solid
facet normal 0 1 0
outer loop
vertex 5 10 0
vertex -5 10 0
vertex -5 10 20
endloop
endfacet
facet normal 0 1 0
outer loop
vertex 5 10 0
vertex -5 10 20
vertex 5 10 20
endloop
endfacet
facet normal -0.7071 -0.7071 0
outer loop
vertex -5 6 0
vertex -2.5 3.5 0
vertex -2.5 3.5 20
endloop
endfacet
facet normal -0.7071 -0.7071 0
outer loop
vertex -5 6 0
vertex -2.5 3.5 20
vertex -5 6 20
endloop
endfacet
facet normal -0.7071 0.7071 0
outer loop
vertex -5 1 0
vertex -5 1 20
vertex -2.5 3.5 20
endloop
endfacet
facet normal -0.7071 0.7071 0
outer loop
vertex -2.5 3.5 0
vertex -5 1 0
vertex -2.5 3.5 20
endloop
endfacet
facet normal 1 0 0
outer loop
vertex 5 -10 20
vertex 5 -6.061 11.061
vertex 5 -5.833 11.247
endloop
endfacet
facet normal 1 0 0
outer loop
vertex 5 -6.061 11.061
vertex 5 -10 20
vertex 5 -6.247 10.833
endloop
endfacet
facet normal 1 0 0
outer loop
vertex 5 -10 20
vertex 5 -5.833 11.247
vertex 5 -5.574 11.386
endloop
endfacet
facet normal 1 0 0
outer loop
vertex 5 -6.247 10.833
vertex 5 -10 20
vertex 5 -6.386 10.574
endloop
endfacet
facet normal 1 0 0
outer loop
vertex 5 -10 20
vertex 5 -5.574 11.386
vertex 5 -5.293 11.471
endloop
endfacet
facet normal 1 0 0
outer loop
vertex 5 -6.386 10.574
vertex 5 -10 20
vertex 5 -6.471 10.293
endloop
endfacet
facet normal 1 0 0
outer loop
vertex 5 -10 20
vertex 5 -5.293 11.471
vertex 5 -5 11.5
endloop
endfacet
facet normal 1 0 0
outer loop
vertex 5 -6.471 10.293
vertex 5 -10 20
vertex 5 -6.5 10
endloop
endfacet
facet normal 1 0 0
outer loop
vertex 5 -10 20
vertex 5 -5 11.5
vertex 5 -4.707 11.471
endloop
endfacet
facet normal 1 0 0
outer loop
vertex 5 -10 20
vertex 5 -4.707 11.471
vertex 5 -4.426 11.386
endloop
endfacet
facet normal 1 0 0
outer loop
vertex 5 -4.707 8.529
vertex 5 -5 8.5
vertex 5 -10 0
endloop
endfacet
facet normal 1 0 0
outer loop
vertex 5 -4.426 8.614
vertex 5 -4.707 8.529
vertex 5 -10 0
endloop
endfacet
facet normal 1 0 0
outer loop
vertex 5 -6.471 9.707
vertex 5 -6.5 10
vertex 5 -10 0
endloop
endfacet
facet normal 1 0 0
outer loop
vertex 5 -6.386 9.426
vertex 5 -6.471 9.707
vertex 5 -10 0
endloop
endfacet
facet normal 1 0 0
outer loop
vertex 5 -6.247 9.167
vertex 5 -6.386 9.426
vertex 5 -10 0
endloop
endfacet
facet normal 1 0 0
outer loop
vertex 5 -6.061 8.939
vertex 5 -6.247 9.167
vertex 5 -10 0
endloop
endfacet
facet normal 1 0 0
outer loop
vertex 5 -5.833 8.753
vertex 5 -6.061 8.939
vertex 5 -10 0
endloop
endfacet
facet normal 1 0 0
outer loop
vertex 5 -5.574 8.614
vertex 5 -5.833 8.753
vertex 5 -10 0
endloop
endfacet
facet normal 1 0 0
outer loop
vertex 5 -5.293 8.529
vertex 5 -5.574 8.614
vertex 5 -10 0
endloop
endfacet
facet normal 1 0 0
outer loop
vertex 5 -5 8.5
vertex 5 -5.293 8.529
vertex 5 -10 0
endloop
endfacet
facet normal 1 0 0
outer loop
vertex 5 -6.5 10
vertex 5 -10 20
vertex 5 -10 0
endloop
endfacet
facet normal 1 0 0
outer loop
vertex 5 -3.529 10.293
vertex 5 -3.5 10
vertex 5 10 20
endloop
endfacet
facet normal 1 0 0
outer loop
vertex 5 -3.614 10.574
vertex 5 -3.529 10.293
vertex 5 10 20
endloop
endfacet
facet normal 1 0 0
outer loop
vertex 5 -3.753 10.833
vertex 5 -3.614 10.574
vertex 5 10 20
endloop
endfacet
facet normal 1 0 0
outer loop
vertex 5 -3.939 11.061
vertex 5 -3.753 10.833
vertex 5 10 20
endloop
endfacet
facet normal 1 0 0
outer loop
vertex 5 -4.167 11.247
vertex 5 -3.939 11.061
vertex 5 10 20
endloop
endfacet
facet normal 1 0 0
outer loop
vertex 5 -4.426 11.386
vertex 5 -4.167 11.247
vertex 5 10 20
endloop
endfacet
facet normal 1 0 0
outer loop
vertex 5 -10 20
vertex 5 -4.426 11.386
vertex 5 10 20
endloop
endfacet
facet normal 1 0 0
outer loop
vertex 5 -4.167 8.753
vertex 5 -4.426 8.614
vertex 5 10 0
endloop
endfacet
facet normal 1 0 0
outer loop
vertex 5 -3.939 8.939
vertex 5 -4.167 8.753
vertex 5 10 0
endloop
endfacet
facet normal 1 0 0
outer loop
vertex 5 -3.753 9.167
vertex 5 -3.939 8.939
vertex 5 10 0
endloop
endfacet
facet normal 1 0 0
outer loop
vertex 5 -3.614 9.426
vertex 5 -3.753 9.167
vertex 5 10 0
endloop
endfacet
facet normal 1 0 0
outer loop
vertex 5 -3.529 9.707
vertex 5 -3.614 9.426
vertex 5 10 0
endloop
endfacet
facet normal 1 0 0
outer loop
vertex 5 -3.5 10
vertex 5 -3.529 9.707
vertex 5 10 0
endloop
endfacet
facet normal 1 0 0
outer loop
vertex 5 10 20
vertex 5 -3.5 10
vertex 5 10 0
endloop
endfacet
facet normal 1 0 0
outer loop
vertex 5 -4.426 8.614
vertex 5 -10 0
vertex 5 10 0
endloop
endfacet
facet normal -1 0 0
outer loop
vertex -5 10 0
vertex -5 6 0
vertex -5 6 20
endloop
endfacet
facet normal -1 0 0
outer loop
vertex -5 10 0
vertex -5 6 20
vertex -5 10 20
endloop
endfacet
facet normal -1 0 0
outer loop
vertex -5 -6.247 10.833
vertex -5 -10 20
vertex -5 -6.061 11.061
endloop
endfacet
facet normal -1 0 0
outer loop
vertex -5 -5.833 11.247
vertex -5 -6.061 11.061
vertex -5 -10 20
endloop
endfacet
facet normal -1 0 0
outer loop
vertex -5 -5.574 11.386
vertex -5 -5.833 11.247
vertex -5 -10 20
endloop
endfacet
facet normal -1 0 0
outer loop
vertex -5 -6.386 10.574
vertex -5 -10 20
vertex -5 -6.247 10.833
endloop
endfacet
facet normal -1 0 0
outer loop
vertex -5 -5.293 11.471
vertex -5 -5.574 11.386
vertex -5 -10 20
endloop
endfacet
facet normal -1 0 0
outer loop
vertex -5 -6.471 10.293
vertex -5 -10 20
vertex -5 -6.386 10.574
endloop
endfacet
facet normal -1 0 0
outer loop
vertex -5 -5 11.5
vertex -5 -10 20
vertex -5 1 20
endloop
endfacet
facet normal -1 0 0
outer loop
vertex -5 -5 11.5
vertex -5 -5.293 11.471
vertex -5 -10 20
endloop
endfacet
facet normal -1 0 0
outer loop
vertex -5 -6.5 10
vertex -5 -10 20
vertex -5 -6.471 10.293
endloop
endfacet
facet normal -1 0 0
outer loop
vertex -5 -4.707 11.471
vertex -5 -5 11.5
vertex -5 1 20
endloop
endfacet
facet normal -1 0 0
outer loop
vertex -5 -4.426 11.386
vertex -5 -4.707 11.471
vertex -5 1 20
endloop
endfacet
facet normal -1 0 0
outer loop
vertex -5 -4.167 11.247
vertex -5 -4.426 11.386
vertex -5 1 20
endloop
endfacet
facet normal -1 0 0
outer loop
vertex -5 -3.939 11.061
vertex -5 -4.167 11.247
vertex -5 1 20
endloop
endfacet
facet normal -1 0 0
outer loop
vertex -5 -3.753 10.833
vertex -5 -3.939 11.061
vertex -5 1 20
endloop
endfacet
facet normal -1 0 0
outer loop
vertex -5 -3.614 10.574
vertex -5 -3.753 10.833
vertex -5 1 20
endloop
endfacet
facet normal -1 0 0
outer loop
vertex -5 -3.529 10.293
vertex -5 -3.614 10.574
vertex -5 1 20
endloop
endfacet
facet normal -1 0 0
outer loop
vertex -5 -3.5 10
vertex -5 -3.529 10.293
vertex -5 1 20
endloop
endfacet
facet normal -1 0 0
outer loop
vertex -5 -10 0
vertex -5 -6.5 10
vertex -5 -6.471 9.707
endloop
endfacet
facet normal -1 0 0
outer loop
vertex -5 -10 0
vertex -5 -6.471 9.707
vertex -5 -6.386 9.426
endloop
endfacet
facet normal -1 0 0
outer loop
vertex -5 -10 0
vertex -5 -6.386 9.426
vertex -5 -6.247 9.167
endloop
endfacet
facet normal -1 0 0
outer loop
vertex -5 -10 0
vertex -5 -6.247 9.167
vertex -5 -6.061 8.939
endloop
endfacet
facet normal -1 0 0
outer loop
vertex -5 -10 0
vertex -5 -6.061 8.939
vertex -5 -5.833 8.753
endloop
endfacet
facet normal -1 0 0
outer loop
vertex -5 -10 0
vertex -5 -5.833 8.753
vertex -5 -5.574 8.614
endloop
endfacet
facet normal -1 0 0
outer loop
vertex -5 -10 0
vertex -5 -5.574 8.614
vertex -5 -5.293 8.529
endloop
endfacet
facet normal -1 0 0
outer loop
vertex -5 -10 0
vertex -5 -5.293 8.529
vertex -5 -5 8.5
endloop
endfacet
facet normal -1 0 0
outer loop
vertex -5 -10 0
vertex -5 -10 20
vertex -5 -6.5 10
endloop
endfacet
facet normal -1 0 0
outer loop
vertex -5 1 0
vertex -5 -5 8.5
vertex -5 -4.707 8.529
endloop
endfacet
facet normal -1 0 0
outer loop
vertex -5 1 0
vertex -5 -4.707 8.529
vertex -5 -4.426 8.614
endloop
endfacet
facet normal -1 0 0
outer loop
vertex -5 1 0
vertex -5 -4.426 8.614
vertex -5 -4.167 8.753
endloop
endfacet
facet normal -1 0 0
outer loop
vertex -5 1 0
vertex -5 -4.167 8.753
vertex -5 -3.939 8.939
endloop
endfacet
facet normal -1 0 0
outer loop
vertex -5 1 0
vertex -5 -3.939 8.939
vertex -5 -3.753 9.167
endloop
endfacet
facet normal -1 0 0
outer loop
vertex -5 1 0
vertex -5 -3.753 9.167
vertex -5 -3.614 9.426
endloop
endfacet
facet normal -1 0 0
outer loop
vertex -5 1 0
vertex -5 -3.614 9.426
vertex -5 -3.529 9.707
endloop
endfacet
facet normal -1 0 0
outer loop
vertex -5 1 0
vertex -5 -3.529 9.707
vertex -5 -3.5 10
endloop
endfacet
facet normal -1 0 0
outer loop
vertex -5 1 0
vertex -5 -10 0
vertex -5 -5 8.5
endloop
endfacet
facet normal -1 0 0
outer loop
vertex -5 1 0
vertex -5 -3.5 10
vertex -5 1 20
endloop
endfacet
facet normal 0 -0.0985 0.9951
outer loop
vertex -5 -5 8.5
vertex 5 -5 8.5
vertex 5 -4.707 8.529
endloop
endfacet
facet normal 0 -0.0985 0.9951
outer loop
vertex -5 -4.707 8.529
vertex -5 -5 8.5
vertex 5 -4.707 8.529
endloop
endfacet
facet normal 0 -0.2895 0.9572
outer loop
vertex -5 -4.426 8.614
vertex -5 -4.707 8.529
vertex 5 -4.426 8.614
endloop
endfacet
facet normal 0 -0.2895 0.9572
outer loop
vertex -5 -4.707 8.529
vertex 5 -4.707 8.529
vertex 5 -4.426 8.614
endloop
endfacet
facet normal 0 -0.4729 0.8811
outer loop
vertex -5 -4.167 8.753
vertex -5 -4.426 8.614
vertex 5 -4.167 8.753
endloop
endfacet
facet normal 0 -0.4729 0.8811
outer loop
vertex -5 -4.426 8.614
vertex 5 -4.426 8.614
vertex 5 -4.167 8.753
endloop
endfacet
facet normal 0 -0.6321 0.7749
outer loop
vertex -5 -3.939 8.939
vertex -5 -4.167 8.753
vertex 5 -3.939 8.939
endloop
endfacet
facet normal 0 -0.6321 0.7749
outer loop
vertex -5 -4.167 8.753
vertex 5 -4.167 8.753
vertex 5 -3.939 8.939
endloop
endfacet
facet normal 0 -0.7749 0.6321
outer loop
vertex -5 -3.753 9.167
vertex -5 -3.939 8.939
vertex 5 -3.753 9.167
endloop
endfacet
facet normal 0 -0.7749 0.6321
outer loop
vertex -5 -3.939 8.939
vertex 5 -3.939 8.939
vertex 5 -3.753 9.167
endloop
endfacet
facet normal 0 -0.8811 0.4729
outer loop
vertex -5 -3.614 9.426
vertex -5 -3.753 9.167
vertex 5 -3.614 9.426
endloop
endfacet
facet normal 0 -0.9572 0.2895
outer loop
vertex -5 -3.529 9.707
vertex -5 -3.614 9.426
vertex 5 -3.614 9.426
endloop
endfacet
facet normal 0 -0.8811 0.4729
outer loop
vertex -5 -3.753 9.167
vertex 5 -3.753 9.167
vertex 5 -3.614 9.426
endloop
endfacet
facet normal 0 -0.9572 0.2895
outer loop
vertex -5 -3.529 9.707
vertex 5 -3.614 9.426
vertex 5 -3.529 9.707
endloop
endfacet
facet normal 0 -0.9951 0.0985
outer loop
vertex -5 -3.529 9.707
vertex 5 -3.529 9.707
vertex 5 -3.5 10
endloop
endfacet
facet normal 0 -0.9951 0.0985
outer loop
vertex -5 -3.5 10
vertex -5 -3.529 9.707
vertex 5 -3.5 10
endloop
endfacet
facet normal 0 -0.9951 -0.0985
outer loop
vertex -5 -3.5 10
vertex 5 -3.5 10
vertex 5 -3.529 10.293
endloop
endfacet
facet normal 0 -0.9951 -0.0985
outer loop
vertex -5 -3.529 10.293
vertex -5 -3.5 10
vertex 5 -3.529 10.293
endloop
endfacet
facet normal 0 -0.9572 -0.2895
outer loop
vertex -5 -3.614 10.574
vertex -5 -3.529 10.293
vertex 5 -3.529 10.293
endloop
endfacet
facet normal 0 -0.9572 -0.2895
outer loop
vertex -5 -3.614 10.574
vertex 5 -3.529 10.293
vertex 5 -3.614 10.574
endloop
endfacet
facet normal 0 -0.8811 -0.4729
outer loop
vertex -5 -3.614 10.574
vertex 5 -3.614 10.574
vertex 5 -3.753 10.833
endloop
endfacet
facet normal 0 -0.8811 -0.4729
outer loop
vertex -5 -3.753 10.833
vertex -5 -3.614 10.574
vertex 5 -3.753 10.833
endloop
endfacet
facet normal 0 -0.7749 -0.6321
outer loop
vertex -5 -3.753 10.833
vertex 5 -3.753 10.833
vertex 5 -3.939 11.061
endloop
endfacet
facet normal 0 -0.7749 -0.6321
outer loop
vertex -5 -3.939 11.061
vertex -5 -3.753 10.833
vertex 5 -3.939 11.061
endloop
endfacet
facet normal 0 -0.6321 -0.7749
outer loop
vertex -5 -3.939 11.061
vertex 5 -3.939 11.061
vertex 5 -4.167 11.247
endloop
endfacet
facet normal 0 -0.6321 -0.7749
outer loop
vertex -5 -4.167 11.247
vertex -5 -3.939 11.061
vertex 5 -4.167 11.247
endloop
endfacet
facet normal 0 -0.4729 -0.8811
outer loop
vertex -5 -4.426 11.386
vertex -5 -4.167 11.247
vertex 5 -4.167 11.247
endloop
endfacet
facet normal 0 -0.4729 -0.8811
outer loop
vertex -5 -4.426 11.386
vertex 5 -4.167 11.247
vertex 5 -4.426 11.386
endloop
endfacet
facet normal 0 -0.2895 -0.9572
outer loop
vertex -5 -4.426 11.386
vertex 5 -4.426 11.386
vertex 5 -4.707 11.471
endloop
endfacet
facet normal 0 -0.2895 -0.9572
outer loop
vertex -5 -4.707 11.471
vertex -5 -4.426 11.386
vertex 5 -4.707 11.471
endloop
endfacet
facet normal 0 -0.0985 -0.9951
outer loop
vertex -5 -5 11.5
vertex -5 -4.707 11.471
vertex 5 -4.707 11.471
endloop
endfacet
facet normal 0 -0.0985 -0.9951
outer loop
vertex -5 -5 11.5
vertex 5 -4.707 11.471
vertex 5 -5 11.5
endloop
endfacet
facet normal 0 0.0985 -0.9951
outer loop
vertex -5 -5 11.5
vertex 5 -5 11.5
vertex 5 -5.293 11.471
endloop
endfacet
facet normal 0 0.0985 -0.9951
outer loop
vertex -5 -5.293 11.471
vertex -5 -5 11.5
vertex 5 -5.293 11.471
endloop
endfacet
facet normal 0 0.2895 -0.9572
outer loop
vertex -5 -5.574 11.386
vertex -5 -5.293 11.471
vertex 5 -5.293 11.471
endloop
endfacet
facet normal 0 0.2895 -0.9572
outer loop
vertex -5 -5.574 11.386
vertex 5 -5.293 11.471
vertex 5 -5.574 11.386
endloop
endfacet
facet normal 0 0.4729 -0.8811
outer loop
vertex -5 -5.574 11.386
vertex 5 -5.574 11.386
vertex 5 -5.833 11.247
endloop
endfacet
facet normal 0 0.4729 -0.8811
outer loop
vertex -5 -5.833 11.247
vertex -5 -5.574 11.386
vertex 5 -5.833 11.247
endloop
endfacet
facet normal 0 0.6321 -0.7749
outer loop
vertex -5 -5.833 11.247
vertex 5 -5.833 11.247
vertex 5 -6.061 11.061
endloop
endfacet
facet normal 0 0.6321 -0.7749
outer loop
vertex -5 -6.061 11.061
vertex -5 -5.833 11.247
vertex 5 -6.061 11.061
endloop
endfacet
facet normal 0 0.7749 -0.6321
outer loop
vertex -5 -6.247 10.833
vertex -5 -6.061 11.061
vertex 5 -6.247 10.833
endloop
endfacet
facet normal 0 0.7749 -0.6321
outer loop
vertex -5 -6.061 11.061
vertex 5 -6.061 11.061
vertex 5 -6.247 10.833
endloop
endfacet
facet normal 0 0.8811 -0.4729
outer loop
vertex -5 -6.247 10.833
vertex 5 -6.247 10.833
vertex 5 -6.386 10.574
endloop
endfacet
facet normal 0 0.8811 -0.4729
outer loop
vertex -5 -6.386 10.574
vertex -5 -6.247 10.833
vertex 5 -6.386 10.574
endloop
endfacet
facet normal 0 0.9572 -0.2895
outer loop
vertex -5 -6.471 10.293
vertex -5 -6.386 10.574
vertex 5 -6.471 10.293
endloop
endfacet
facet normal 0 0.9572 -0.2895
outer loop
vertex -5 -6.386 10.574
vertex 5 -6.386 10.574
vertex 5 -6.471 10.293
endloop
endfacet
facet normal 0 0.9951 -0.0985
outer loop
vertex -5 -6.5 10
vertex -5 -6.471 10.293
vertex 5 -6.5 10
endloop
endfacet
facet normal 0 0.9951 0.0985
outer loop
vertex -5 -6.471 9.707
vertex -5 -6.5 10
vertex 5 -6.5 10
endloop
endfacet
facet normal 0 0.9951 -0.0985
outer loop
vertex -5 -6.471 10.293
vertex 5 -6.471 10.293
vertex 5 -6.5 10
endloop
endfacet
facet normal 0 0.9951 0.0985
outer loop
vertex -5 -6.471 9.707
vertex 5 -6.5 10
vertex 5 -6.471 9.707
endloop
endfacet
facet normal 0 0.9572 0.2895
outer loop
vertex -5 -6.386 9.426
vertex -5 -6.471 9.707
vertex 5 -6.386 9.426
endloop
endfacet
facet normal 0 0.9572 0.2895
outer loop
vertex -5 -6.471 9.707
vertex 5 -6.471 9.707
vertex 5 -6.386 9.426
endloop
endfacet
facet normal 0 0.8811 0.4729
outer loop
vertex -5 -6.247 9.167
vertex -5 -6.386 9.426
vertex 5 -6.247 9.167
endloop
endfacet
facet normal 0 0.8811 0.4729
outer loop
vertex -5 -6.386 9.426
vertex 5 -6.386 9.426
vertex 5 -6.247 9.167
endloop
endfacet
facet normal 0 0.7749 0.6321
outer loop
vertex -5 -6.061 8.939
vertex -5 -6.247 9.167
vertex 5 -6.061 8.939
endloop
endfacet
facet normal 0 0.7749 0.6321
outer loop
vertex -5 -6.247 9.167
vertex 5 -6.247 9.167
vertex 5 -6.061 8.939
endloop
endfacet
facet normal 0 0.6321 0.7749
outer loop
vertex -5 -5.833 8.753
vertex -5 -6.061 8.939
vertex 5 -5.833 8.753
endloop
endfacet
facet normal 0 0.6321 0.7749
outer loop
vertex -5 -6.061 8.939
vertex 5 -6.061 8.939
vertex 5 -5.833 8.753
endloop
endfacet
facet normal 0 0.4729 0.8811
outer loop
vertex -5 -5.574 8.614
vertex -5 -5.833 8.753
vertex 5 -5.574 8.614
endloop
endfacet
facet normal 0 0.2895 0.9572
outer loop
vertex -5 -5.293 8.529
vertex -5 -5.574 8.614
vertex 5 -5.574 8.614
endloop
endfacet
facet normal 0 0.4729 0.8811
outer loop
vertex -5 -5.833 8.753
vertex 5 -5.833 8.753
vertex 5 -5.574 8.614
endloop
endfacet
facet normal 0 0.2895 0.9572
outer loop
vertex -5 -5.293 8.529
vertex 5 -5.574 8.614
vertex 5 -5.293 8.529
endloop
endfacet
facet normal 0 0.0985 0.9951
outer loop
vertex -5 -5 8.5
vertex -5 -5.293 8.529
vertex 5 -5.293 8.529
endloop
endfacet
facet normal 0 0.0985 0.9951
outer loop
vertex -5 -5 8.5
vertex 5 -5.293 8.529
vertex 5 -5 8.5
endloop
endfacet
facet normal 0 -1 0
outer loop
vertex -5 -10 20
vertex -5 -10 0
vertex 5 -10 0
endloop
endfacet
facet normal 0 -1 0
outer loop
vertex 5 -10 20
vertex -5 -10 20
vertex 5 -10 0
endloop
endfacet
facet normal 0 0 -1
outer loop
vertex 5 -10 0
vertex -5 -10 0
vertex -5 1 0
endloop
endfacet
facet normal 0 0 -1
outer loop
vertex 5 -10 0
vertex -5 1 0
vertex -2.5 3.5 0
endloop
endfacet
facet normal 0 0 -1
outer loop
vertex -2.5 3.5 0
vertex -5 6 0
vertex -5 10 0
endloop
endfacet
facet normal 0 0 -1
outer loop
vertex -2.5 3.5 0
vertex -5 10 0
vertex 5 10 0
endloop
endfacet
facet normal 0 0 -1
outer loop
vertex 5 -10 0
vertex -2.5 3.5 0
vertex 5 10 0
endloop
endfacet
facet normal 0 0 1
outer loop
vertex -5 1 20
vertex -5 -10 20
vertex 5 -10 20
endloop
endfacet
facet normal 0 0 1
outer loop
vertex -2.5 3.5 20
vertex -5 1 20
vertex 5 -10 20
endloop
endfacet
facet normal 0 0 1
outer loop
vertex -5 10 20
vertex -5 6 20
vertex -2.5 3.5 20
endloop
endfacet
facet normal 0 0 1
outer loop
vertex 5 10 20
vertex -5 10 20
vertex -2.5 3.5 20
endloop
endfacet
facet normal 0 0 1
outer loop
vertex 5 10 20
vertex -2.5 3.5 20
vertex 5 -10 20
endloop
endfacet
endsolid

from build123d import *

# Parameters (mm, degrees)
ESQUISSE1_W           = 10
ESQUISSE1_H           = 20
EXTRUSION1_DEPTH      = 20
EXTRUSION2_DEPTH      = 23.912878475
EXTRUSION2_DEPTH_BACK = 23.912878475
ESQUISSE4_R           = 1.5
EXTRUSION3_DEPTH      = 40


with BuildPart() as part:
    # Esquisse1 → Extrusion1 (new body)
    with BuildSketch(Plane.XY):
        Rectangle(ESQUISSE1_W, ESQUISSE1_H)
    extrude(amount=EXTRUSION1_DEPTH)

    # Esquisse3 → Extrusion2 (cut, two sides: drawn at the far end of the back side and taken through both)
    with BuildSketch(Plane.XY.offset(20).offset(-EXTRUSION2_DEPTH_BACK)):
        Polygon((-38.75439594, 39.75439594), (-5, 6), (-2.5, 3.5), (-5, 1), (-38.75439594, -32.75439594), (-134.226244997, -32.75439594), (-134.226244997, 39.75439594), align=None)
    extrude(amount=EXTRUSION2_DEPTH + EXTRUSION2_DEPTH_BACK, mode=Mode.SUBTRACT)

    # Esquisse4 → Extrusion3 (cut)
    with BuildSketch(Plane(origin=(5, 0, 0), x_dir=(0, 0, -1), z_dir=(1, 0, 0))):
        with Locations((-10, -5)):
            Circle(ESQUISSE4_R)
    extrude(amount=-EXTRUSION3_DEPTH, mode=Mode.SUBTRACT)


solid = part.part
